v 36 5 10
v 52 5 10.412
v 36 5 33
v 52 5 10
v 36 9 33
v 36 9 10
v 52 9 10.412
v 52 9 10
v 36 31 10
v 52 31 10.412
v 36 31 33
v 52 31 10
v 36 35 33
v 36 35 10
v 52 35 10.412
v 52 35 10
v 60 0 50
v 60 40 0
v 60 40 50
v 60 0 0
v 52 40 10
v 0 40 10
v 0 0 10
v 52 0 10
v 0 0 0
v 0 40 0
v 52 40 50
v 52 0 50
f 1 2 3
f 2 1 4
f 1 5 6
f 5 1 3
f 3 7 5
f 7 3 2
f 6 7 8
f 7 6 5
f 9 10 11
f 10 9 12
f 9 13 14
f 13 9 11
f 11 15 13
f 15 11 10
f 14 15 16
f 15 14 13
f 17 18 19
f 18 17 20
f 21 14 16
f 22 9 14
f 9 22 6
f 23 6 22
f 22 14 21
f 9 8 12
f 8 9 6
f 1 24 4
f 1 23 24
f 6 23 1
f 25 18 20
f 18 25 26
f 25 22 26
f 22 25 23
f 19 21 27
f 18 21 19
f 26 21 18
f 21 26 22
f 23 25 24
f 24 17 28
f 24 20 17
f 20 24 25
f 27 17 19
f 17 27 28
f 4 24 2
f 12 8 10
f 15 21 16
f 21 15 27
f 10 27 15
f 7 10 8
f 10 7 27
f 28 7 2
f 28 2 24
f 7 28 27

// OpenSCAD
$fn = 32;

// ----------------------------------------------------------------------
// Rib bracket: 2-gusset L bracket
// ----------------------------------------------------------------------

// --- parameters (mm) ---
base_l = 60;              // foot length, X
base_w = 40;              // foot width, Y
base_t = 10;              // foot thickness
plate_t = 8;              // upright plate thickness
plate_h = 50;             // overall height
gus_l = 16;               // gusset leg along the foot
gus_h = 24;               // gusset height
gus_t = 4;                // gusset thickness
gus_edge = 5;             // gusset margin from the foot edge
n_gus = 2;                // gusset count

gus_pitch = (base_w - 2 * gus_edge - gus_t) / (n_gus - 1);  // gusset pitch

union() {
  cube([base_l, base_w, base_t]);
  translate([base_l - plate_t, 0, base_t - 1])
    cube([plate_t, base_w, plate_h - base_t + 1]);
  for (i = [0 : n_gus - 1])
    translate([base_l - plate_t - gus_l, gus_edge + i * gus_pitch, base_t - 1])
      rotate([-90, 0, 0])
        linear_extrude(height = gus_t)
          polygon(points = [[0, 0], [gus_l + 1, 0], [0, -gus_h]]);
}
